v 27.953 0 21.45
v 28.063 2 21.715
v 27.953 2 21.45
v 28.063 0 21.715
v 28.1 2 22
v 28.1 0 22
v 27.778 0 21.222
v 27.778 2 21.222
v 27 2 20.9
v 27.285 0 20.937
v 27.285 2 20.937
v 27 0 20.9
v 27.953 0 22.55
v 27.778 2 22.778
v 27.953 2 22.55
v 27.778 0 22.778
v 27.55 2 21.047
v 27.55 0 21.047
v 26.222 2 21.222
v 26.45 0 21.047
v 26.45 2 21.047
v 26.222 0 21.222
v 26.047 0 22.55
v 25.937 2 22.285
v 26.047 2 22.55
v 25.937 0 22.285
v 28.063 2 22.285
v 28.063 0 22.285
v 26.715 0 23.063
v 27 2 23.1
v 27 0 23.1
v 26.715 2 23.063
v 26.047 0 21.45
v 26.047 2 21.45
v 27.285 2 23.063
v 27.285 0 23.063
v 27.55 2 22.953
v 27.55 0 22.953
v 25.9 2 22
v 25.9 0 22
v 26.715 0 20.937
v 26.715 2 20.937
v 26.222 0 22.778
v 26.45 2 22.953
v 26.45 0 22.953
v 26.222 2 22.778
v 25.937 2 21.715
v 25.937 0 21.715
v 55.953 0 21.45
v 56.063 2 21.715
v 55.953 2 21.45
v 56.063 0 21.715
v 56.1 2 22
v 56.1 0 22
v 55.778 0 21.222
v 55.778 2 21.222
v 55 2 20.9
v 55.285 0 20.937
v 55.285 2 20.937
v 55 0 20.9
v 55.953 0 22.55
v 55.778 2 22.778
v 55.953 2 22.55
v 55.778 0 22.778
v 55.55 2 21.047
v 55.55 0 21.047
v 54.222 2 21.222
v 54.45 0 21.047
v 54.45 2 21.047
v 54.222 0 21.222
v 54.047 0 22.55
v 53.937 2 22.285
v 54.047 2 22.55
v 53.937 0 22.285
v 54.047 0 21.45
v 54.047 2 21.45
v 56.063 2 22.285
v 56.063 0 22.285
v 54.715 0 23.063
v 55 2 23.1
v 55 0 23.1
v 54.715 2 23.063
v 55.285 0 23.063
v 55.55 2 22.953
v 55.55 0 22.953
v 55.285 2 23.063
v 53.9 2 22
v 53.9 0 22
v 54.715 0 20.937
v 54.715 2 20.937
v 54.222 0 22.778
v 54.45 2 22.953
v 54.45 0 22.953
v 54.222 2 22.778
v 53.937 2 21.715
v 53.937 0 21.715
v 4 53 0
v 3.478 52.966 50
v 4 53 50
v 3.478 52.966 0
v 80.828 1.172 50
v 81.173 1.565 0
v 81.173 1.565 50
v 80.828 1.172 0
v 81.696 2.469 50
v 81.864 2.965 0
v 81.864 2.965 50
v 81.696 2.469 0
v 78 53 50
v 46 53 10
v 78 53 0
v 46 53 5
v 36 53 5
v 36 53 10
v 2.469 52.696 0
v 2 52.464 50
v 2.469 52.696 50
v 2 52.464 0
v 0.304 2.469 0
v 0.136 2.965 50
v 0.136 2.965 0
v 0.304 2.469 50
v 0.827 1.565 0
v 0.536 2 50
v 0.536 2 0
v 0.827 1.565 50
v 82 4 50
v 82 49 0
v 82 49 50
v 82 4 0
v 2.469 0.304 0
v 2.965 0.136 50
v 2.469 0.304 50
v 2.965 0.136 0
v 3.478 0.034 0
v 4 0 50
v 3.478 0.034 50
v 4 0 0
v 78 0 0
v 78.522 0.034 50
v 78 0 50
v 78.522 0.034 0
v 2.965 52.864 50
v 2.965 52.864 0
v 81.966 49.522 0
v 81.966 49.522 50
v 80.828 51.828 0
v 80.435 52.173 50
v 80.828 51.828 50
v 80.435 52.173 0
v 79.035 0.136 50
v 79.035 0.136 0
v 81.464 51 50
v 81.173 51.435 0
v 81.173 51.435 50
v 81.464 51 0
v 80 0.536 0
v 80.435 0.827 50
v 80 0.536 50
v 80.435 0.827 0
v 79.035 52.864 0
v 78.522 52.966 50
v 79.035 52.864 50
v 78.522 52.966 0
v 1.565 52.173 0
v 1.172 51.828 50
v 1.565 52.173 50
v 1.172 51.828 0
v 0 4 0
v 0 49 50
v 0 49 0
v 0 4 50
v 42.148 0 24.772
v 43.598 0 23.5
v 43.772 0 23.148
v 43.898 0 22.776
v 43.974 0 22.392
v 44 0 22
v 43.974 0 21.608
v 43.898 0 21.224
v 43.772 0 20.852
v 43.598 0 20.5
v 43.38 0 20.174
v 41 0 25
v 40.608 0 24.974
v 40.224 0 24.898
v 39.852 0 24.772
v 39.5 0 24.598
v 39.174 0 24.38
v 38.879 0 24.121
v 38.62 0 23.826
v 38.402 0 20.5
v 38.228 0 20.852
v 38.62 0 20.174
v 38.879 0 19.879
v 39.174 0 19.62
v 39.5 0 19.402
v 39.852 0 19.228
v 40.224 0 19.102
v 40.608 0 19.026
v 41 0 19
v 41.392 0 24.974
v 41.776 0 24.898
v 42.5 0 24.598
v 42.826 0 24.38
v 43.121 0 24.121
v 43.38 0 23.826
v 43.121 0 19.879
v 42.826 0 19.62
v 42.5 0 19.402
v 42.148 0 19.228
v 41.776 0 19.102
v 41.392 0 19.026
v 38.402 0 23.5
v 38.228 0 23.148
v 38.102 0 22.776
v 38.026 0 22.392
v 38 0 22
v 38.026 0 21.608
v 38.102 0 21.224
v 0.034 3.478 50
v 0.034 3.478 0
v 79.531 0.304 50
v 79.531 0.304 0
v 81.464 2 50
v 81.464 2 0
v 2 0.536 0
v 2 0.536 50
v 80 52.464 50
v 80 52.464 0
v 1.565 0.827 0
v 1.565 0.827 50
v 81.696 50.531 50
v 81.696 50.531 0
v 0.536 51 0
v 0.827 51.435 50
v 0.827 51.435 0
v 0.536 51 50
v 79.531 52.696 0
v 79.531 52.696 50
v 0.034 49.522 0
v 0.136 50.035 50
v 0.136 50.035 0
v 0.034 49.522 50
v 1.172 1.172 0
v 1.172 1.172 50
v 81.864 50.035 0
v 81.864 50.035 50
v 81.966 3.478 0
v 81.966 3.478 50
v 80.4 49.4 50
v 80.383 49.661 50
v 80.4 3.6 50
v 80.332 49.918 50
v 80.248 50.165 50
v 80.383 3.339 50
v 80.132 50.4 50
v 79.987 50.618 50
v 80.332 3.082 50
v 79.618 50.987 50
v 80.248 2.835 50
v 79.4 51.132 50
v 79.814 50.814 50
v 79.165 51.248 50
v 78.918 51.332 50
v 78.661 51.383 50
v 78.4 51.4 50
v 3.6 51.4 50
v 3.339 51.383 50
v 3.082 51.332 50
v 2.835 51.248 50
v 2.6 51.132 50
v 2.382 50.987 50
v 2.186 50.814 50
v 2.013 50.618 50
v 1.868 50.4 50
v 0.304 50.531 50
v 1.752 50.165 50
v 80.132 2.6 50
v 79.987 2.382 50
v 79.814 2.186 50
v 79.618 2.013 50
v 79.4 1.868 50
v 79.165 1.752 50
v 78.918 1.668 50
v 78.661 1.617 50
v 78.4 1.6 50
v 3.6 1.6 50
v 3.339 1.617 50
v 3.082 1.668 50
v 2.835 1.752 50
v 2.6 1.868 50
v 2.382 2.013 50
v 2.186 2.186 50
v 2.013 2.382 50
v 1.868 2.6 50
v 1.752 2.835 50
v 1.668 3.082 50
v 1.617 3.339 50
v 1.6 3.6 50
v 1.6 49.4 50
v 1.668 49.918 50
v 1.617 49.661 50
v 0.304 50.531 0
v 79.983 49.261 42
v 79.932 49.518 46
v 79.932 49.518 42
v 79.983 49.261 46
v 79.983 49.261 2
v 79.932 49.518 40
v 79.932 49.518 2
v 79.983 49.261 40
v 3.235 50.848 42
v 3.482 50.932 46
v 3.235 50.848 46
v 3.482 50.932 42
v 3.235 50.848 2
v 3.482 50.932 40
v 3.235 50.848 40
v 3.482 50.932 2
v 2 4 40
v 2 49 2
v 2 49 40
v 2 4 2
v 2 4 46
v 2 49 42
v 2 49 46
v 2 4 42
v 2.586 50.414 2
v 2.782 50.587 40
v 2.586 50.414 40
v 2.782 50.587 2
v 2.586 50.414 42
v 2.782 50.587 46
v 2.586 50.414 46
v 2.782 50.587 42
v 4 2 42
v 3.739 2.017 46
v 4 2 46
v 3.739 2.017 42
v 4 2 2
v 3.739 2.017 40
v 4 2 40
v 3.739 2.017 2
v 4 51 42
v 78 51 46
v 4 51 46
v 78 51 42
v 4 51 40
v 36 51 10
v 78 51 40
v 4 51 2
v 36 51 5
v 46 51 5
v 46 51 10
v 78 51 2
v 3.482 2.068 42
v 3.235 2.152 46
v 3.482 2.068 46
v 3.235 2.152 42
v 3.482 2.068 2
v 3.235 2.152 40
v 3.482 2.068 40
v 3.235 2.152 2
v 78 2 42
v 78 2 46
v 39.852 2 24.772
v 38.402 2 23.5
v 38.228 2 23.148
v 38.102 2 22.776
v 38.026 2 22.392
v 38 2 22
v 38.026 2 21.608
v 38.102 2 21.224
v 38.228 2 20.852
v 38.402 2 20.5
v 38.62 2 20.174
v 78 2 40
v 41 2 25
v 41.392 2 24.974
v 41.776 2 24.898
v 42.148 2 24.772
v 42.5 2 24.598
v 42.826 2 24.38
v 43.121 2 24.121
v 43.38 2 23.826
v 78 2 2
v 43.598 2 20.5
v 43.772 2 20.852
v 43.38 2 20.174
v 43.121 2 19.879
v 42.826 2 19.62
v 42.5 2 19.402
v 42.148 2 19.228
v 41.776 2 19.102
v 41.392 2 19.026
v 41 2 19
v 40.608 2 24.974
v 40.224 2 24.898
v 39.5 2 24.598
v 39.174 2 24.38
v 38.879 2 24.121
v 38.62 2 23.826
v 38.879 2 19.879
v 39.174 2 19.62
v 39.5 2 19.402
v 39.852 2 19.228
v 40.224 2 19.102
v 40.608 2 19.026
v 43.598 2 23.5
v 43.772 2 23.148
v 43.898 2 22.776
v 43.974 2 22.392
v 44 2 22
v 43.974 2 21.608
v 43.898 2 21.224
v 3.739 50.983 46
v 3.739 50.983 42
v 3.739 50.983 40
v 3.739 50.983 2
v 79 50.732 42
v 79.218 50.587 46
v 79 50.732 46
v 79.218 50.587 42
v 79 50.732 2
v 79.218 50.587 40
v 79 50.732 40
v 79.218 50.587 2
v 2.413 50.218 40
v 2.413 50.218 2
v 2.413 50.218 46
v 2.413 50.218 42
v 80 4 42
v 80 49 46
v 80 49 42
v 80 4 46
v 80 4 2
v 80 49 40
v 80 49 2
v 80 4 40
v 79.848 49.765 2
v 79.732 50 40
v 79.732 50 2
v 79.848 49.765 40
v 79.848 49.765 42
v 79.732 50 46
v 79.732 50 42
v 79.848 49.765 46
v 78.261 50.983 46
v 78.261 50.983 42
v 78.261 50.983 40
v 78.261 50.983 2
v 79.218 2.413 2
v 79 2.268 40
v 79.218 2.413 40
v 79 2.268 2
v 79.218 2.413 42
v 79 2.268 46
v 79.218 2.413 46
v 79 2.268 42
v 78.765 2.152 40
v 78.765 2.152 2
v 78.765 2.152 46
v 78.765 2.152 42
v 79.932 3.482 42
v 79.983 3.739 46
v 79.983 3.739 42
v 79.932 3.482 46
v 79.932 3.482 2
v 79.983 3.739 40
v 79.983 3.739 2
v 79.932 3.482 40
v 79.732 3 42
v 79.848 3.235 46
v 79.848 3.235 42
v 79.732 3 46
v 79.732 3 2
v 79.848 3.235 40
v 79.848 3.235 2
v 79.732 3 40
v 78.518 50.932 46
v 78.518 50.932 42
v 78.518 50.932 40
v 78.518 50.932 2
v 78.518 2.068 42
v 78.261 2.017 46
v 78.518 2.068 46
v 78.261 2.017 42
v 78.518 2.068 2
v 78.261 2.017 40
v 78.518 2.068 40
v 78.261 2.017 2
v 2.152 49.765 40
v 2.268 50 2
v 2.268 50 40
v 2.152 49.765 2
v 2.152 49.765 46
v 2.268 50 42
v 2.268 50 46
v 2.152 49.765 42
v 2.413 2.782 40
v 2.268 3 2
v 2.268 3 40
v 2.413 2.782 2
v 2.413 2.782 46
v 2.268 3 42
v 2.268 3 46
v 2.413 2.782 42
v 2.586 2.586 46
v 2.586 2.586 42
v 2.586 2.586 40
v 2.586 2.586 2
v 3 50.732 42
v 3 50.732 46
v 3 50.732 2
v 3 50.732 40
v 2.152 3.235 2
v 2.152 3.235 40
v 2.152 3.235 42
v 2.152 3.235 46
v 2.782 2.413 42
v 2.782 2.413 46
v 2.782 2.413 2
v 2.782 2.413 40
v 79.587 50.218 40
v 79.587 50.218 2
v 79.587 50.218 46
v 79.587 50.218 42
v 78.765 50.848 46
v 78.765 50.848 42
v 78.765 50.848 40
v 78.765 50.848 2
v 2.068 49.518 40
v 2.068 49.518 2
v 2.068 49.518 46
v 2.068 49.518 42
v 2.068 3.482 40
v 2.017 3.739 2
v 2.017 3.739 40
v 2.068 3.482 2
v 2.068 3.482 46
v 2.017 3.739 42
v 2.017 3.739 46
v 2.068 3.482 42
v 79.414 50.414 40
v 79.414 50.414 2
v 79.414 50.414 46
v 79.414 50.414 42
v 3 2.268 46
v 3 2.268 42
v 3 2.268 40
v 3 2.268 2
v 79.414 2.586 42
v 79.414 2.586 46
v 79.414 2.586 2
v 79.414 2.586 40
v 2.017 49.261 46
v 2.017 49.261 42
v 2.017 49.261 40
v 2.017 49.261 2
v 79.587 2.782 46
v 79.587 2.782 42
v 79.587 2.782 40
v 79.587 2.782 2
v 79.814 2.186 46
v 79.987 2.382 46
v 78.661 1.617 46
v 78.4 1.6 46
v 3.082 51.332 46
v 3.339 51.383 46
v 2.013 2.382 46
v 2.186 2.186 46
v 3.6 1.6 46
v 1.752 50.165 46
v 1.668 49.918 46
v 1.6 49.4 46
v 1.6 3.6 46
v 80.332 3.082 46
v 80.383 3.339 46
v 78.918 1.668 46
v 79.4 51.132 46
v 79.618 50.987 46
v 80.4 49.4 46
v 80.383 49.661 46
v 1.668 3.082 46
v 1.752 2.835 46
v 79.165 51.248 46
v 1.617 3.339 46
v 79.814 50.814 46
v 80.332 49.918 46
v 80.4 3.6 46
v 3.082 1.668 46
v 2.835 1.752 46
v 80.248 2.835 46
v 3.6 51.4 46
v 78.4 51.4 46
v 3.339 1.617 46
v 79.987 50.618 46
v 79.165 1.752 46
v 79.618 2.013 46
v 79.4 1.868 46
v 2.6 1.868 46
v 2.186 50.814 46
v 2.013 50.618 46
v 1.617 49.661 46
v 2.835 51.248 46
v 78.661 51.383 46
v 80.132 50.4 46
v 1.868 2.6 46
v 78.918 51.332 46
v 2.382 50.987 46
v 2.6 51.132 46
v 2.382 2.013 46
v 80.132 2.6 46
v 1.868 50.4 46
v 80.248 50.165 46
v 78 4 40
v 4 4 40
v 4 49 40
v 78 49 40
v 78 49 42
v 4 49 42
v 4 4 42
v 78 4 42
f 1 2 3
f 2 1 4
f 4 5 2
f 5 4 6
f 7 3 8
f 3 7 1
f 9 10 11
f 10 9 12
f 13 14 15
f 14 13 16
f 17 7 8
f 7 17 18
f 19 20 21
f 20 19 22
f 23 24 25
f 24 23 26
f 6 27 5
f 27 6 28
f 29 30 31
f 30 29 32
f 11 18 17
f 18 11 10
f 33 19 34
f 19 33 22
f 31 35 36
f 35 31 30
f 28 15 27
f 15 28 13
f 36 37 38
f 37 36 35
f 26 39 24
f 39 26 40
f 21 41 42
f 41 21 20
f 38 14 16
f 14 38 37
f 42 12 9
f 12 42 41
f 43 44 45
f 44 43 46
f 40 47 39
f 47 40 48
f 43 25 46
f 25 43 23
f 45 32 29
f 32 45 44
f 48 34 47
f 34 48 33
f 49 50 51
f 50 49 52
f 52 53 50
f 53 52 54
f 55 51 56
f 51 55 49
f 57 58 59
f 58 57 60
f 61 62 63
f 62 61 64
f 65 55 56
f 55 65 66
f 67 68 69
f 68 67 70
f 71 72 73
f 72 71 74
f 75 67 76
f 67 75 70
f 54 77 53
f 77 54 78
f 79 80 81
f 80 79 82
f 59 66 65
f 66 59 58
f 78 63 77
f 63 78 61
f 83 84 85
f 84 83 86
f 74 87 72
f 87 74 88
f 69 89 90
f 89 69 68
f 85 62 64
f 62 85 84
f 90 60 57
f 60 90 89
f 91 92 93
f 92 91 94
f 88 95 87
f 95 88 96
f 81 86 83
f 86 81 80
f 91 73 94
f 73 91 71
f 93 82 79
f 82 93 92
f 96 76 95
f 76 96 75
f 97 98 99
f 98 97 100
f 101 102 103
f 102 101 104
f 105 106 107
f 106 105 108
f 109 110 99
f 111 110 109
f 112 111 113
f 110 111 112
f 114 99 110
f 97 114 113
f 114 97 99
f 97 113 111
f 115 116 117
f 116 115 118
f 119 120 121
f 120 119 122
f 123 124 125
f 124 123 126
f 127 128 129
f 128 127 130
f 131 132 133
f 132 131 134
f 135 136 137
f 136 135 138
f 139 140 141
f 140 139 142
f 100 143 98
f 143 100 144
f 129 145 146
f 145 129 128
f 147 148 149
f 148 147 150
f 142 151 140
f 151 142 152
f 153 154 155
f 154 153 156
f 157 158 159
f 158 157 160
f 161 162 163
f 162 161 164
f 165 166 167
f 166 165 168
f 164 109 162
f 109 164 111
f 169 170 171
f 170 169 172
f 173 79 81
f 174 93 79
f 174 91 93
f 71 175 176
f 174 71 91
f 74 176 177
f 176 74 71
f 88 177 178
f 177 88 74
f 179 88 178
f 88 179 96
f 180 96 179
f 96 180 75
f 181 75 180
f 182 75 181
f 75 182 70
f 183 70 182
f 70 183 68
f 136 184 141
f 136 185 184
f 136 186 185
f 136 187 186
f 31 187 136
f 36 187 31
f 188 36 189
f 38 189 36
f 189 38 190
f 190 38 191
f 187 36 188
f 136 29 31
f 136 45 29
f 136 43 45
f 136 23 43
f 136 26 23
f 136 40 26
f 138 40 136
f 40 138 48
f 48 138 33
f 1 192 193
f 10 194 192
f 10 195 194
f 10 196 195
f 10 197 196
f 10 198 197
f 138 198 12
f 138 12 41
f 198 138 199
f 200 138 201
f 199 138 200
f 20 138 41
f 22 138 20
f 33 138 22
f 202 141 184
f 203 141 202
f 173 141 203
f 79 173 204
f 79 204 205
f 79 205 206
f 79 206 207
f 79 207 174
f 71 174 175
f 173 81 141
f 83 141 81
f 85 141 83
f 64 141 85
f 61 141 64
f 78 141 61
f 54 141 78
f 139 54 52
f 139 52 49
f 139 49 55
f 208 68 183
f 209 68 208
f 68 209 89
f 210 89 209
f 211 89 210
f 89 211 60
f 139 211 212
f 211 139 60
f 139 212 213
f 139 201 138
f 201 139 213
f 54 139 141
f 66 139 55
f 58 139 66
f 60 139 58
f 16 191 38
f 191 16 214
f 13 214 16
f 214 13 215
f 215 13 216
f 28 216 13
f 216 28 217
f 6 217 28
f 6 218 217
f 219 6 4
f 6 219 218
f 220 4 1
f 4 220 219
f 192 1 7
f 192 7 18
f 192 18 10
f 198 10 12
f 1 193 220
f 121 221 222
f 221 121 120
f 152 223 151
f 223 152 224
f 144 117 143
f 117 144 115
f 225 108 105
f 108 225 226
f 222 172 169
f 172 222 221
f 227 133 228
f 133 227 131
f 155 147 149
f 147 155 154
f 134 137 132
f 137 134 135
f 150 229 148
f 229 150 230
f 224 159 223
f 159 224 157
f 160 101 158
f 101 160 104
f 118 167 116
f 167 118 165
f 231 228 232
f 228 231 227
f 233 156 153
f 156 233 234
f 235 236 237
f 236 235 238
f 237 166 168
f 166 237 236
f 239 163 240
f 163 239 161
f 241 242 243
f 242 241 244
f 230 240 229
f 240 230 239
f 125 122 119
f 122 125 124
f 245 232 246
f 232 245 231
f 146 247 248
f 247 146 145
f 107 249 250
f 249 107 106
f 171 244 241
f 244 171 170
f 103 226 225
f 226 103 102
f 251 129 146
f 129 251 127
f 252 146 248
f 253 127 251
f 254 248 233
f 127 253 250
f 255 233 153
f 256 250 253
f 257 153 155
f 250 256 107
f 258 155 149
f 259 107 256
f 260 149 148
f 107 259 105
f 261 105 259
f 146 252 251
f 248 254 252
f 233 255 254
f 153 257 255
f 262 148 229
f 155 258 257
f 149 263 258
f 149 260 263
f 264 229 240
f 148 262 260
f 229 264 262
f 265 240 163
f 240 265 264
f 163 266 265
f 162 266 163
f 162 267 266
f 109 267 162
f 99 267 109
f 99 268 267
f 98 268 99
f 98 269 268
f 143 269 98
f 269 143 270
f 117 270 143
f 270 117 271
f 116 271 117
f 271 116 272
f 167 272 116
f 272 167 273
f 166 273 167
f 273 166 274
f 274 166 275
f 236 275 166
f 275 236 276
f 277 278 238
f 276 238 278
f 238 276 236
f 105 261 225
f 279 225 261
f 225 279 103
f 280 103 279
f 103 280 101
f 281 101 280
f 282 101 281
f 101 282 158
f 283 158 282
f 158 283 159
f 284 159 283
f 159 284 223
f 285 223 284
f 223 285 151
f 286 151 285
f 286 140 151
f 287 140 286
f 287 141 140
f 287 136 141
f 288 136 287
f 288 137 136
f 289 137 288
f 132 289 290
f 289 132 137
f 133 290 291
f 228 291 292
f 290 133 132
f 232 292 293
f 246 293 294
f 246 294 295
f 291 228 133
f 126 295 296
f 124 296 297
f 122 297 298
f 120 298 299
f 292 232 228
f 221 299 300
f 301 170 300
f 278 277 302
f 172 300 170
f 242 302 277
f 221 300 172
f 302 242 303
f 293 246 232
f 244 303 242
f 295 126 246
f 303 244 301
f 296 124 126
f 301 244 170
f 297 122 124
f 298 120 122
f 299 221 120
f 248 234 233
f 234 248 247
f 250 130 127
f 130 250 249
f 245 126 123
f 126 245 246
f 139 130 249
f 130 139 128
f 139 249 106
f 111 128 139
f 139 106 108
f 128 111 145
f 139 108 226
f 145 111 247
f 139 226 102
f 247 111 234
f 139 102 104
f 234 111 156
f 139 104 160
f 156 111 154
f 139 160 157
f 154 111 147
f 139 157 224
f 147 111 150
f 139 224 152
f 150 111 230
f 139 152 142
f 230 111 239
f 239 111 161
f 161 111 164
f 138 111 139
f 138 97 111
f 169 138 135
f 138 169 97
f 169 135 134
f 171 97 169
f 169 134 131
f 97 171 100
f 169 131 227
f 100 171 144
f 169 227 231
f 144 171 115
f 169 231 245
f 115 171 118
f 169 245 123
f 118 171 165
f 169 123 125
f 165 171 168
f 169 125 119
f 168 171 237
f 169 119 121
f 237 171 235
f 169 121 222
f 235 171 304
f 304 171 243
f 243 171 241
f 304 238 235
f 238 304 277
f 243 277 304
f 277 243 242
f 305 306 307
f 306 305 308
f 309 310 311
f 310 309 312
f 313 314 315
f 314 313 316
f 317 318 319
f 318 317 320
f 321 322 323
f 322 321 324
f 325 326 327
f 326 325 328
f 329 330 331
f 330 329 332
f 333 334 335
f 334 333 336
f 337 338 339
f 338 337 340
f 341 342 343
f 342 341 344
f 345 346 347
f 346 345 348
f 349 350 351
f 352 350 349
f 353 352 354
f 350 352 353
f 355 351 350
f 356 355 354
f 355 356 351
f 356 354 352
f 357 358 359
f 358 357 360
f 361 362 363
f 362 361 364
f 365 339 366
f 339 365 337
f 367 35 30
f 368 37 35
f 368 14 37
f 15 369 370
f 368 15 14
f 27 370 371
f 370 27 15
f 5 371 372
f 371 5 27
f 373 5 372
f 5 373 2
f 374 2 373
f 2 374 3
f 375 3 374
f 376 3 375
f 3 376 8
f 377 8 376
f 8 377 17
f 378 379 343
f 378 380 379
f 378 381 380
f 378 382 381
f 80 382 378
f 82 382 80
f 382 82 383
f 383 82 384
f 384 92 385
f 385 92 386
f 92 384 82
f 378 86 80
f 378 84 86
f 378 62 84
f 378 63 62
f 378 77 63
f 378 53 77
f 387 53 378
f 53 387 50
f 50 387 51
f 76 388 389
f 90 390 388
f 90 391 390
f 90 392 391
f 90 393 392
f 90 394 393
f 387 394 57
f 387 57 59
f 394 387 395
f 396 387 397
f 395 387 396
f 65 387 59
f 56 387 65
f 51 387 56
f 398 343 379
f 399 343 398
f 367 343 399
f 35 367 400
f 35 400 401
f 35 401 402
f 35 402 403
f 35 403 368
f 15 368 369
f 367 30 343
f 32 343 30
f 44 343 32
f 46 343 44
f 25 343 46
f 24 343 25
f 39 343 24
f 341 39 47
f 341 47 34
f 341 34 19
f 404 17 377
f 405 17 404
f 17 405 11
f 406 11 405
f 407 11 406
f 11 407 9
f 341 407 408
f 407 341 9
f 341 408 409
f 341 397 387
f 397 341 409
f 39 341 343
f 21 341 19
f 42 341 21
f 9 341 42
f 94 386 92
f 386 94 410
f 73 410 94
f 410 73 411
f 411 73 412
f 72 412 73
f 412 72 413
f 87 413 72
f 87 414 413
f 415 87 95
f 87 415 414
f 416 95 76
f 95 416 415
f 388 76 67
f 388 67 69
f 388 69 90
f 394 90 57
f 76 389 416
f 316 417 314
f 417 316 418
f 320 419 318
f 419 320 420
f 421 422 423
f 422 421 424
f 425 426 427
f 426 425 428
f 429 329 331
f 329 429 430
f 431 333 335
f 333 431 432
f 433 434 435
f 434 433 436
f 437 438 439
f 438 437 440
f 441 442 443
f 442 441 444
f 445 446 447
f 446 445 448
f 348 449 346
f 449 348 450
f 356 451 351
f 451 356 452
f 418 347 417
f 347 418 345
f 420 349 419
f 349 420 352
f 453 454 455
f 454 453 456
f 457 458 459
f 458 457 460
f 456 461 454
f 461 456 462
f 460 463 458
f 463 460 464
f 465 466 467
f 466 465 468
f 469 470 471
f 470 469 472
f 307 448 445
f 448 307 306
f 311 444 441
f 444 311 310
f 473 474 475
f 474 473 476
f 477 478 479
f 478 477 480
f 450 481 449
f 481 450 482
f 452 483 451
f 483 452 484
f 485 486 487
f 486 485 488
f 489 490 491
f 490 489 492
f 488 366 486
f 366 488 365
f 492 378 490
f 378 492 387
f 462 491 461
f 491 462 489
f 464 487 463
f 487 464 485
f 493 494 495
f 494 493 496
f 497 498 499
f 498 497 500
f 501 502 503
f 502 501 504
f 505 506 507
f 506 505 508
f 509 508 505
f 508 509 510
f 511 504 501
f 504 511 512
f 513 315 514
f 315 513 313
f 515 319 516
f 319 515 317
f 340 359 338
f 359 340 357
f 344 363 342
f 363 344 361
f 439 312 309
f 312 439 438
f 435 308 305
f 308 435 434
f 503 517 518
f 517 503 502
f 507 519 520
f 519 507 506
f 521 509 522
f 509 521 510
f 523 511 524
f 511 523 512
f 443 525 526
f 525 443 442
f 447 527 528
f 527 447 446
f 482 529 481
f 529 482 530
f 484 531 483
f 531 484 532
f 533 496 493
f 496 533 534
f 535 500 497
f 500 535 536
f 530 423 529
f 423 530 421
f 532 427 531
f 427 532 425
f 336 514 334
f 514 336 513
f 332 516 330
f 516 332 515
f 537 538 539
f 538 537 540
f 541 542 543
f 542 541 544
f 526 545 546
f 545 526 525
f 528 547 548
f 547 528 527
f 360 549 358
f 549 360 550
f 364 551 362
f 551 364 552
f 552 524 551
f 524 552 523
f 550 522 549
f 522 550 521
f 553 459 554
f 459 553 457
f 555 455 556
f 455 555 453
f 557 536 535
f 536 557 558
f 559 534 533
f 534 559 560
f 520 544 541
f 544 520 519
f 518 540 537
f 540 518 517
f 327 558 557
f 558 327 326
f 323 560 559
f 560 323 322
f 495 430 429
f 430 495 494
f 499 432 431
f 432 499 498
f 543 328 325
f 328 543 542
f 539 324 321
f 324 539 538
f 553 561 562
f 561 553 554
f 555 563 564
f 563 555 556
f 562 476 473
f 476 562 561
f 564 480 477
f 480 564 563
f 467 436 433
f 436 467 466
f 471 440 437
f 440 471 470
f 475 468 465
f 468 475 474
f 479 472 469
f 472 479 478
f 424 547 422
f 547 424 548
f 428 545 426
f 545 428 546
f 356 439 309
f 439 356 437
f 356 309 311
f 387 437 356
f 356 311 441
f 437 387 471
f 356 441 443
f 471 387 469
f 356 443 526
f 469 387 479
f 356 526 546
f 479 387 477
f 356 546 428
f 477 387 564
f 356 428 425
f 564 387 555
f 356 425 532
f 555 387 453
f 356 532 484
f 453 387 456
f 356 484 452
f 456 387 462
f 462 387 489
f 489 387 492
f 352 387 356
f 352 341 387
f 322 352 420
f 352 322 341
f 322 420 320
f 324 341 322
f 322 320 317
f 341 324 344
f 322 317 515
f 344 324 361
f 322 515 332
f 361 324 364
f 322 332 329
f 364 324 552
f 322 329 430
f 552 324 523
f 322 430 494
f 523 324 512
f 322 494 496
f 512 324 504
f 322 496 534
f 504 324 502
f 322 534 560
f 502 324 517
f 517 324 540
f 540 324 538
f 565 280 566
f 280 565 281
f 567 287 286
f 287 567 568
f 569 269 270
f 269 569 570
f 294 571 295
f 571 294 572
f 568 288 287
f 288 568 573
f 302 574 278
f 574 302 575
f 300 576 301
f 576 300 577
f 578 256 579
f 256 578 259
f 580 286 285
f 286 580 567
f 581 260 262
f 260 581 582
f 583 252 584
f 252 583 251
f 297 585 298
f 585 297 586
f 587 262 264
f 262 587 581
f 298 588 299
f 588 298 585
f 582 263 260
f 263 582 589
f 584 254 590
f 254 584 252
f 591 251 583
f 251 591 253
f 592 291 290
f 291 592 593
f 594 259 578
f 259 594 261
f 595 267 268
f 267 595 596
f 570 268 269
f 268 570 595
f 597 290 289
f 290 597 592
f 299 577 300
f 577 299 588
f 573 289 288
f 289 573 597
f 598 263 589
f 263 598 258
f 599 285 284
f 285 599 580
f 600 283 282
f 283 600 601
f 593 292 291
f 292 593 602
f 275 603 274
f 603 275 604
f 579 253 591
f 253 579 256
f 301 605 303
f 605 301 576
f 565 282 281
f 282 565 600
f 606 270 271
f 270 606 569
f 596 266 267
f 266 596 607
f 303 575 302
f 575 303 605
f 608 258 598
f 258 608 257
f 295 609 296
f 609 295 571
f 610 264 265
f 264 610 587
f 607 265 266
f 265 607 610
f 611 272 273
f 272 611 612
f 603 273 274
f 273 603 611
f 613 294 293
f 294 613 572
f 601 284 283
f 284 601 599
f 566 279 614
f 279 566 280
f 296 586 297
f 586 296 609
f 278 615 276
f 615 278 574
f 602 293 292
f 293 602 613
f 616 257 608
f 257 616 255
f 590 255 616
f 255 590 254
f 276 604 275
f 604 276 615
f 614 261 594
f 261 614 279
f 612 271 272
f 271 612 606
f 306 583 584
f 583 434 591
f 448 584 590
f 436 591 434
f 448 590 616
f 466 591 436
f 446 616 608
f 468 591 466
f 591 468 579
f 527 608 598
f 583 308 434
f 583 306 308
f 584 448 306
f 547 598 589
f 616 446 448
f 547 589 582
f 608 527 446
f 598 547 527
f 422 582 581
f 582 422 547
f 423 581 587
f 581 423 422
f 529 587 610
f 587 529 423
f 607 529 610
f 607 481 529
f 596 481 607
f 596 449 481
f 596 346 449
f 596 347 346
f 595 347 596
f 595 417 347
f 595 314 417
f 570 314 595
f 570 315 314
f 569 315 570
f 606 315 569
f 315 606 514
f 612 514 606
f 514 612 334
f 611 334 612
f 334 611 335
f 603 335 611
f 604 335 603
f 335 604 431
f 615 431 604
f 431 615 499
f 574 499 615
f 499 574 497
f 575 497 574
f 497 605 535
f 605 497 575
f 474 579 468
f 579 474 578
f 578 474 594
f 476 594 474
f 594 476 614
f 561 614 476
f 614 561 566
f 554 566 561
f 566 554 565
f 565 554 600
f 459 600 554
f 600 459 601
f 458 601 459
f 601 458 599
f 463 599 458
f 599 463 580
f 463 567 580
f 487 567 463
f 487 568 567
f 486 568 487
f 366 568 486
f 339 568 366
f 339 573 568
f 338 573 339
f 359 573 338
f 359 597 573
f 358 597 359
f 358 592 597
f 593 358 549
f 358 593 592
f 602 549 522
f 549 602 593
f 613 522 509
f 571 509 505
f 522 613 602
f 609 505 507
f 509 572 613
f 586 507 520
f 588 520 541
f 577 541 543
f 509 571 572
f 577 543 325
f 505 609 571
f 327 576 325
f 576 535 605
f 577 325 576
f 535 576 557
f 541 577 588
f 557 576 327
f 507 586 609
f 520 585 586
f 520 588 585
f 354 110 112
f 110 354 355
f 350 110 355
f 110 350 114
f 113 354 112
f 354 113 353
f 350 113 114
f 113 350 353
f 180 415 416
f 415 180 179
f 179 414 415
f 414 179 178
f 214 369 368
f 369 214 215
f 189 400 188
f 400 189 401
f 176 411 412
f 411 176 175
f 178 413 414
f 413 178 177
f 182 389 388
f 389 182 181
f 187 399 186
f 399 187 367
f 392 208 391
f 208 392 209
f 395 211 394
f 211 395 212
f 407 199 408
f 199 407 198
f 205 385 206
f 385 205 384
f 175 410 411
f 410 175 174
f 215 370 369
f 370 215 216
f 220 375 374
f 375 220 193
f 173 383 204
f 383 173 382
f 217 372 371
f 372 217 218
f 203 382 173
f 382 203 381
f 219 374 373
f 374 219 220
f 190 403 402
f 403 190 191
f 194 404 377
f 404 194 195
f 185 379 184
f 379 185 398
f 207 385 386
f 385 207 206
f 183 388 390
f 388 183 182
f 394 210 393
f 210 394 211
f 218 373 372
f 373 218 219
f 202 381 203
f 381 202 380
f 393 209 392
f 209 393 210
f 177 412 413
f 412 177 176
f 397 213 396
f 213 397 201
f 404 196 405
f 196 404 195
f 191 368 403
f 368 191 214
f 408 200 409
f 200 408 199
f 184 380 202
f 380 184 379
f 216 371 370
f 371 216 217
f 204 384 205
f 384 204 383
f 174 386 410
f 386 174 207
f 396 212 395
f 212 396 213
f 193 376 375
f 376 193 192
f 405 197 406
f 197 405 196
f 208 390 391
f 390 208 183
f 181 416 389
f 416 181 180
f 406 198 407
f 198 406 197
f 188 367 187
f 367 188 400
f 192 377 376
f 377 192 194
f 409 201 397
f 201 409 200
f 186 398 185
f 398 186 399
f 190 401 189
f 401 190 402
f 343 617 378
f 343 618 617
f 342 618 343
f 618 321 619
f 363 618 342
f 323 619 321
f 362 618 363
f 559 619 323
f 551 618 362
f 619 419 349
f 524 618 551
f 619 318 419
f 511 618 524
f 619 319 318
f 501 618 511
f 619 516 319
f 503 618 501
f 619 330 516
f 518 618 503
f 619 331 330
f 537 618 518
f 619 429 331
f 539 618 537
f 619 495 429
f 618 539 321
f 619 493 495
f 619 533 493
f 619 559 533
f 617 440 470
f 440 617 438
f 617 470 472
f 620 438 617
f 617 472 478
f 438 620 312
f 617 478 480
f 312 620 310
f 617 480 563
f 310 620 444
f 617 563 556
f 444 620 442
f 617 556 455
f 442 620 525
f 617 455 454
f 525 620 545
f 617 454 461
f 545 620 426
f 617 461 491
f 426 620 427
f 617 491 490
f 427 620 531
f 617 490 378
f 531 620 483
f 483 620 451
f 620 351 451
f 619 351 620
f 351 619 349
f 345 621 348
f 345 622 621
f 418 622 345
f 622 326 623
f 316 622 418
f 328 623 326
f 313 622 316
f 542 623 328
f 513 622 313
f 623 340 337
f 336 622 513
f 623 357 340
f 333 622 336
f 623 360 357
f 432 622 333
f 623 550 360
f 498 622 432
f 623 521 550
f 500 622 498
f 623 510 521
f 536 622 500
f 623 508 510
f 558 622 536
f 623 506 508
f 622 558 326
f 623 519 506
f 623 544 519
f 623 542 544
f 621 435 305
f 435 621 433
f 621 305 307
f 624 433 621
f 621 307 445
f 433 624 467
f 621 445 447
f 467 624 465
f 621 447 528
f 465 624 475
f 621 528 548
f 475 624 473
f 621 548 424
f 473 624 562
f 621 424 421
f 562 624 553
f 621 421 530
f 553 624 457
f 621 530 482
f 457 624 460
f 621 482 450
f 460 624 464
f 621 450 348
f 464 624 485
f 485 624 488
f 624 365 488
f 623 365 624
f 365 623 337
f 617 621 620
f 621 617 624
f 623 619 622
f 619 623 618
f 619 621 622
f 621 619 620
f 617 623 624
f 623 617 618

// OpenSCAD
// Messagebox enclosure — prototype
// Tight box sized around the 72 x 43 OLED with ~3 mm margin on each side.
// Electronics sit loose on the floor (no internal standoffs or screw mounts).
// Servo is fastened to the front wall (torque reaction requires it).
// Render: F5 preview, F6 full render, F7 export STL.
// Two parts: set PART = "body" or "lid" and export separately.

PART = "body"; // "body" | "lid" | "both"

// ---------- Global dimensions ----------
wall        = 2.0;
ext_w       = 82;    // external width  (X, front face) — OLED 72 + 2x3 margin + 2x2 wall
ext_d       = 53;    // external depth  (Y)             — OLED 43 + 2x3 margin + 2x2 wall
ext_h       = 50;    // external height (Z)             — servo body + clearances
corner_r    = 4;     // vertical corner radius (outside)
$fn         = 48;

// Derived interior
int_w = ext_w - 2*wall;   // 78
int_d = ext_d - 2*wall;   // 49
int_h = ext_h - wall;     // 48 (open top, lid closes it)
int_r = max(0.5, corner_r - wall);  // interior radius — keeps wall thickness uniform

// ---------- Lid ----------
lid_h       = 8;                // total lid height
lid_lip_h   = 4;                // lip that drops into body recess
lid_clear   = 0.4;              // slop between lid lip and body opening (per side)

// ---------- OLED module ----------
oled_w      = 72;
oled_d      = 43;
oled_slop   = 1.0;              // per side, so opening = oled + 2*slop

// Top lip that the OLED rests on
lip_w_in    = 2;                // how far lip projects inward from each wall
lip_thk     = 2;                // lip thickness (Z)
lip_top_z   = ext_h - 8;        // top surface of lip (8 mm below top of box)

// ---------- Servo (SG90-class) ----------
servo_screw_pitch = 28;
servo_screw_d     = 2.2;
servo_shaft_d     = 6;
servo_z           = 22;

// ---------- Back wall USB-C cutout ----------
usb_w = 10;
usb_h = 5;
usb_z = 3;

// ============================================================
// Rounded rectangular prism: hull of 4 vertical corner cylinders.
// (w, d, h, r) -> part occupies [0..w] x [0..d] x [0..h] with rounded
// vertical corners of radius r.
module rounded_box(w, d, h, r) {
    hull() {
        for (x = [r, w - r], y = [r, d - r])
            translate([x, y, 0]) cylinder(r = r, h = h);
    }
}

// ============================================================
module body() {
    difference() {
        // Outer shell (rounded)
        rounded_box(ext_w, ext_d, ext_h, corner_r);

        // Interior cavity (rounded, smaller radius to preserve wall)
        translate([wall, wall, wall])
            rounded_box(int_w, int_d, ext_h, int_r);

        // Lid recess — rim steps down by lid_lip_h
        translate([wall - lid_clear, wall - lid_clear, ext_h - lid_lip_h])
            rounded_box(int_w + 2*lid_clear, int_d + 2*lid_clear,
                        lid_lip_h + 0.01, int_r);

        // USB-C cutout in back wall
        translate([(ext_w - usb_w)/2, ext_d - wall - 0.01, wall + usb_z])
            cube([usb_w, wall + 0.02, usb_h]);

        // Servo shaft through front wall
        translate([ext_w/2, -0.01, servo_z])
            rotate([-90, 0, 0])
                cylinder(d = servo_shaft_d, h = wall + 0.02, $fn = 48);

        // Servo screw holes through front wall
        for (dx = [-servo_screw_pitch/2, servo_screw_pitch/2])
            translate([ext_w/2 + dx, -0.01, servo_z])
                rotate([-90, 0, 0])
                    cylinder(d = servo_screw_d, h = wall + 0.02, $fn = 24);
    }

    // OLED rest lip — rounded outer (matches interior), rectangular OLED opening.
    opening_w = oled_w + 2*oled_slop;   // 74
    opening_d = oled_d + 2*oled_slop;   // 45
    translate([0, 0, lip_top_z - lip_thk])
        difference() {
            translate([wall, wall, 0])
                rounded_box(int_w, int_d, lip_thk, int_r);
            translate([(ext_w - opening_w)/2, (ext_d - opening_d)/2, -0.01])
                cube([opening_w, opening_d, lip_thk + 0.02]);
        }
}

// ============================================================
module lid() {
    top_w = ext_w;
    top_d = ext_d;
    lip_w = int_w + 2*lid_clear - 0.4;   // slight slop into recess
    lip_d = int_d + 2*lid_clear - 0.4;
    lip_r = max(0.5, int_r - 0.2);

    // Top plate (matches exterior footprint & radius)
    rounded_box(top_w, top_d, lid_h - lid_lip_h, corner_r);

    // Lip hanging below plate, centered
    translate([(top_w - lip_w)/2, (top_d - lip_d)/2, -(lid_lip_h)])
        rounded_box(lip_w, lip_d, lid_lip_h, lip_r);
}

// ============================================================
if (PART == "body")      body();
else if (PART == "lid")  translate([0, 0, ext_h + 10]) lid();
else { body(); translate([0, 0, ext_h + 10]) lid(); }
